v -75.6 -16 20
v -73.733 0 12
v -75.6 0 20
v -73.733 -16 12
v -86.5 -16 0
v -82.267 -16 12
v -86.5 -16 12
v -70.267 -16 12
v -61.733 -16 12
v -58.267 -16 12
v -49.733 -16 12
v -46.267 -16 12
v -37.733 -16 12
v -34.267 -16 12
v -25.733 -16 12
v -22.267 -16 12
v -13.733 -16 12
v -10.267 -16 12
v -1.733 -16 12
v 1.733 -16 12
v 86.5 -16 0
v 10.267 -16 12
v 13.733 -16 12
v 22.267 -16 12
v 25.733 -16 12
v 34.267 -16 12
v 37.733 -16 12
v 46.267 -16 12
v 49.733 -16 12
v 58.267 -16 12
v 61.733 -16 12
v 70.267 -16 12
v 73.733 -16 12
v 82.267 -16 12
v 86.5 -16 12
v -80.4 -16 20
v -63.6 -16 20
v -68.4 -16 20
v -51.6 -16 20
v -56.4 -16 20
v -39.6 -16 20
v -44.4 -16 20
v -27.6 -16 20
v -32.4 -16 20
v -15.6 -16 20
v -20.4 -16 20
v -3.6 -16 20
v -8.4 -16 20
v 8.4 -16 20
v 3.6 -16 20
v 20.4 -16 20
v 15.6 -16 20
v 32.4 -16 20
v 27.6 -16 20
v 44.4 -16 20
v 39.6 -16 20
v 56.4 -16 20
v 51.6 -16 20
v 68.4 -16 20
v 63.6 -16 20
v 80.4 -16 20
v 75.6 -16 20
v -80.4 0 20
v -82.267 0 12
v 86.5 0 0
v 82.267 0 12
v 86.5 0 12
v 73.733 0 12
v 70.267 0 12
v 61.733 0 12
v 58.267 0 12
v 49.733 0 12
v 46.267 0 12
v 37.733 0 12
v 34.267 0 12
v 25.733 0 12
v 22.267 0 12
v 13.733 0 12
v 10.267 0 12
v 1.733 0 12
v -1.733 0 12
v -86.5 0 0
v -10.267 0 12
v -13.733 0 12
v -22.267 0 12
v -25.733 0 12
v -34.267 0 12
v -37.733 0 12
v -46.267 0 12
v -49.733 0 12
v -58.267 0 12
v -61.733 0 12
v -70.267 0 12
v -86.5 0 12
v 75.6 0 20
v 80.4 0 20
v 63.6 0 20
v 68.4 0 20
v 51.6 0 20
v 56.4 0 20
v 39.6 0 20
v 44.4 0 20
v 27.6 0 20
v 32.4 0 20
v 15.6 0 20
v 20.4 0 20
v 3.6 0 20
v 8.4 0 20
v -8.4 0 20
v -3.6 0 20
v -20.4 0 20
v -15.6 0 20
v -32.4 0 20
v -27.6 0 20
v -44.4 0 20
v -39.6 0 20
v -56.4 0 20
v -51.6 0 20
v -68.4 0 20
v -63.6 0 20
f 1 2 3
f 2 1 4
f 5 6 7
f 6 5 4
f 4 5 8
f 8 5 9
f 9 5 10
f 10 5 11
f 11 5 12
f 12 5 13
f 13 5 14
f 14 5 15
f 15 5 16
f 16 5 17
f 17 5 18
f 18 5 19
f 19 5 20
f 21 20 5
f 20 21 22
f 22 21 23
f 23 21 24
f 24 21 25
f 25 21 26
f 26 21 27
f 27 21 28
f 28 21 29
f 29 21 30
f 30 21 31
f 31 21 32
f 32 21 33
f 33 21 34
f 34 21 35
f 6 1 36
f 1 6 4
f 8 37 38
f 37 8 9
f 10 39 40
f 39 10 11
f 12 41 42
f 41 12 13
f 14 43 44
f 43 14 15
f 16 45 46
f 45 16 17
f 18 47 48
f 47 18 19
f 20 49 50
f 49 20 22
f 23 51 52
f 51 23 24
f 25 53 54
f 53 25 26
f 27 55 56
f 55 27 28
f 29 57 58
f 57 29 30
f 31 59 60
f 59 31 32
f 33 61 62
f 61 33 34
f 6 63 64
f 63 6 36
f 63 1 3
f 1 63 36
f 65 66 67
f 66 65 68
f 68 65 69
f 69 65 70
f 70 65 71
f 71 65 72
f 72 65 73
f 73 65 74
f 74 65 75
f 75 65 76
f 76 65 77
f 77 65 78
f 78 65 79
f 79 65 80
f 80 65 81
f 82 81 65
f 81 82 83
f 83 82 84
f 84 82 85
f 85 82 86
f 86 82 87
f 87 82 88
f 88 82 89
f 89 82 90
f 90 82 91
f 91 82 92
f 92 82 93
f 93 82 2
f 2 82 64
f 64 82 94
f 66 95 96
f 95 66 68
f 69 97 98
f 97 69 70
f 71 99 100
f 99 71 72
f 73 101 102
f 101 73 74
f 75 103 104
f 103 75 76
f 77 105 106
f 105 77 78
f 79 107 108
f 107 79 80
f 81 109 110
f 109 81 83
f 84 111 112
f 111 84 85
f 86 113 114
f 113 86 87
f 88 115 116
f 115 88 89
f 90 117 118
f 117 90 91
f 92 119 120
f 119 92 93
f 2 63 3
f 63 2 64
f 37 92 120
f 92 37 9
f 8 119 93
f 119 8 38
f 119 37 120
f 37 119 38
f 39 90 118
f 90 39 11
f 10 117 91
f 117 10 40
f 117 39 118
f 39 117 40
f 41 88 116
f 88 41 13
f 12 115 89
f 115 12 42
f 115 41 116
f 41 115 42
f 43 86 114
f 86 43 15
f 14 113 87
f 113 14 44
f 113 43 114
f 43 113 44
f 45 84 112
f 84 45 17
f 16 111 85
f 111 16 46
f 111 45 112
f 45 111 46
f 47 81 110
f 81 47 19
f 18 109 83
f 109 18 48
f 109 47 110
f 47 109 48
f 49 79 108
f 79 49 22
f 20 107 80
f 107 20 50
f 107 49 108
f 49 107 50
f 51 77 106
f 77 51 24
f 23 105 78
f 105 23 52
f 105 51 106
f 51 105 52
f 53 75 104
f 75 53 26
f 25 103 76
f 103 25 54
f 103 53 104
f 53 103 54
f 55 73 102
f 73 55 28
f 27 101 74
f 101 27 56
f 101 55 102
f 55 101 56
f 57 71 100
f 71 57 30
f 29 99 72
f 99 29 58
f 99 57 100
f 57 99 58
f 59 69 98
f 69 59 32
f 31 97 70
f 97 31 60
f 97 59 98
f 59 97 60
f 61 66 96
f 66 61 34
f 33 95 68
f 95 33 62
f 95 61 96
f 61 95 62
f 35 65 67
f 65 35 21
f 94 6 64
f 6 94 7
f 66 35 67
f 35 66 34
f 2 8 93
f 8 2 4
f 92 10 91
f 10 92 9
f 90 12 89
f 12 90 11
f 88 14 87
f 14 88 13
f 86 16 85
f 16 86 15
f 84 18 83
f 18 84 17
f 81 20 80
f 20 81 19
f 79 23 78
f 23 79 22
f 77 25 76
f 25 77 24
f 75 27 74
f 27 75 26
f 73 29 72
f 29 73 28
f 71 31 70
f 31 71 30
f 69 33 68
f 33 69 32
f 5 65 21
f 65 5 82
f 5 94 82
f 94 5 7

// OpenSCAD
$fn = 32;

// ----------------------------------------------------------------------
// Toothed rack, 14 teeth
// 12 mm pitch, 8 mm teeth
// ----------------------------------------------------------------------

// --- parameters (mm) ---
bar_w = 16;     // bar width (Y)
bar_h = 12;     // bar height (Z)
teeth = 14;     // number of teeth
pitch = 12;     // tooth pitch
tooth_h = 8;    // tooth height above the bar
root_w = 9;     // tooth width at the root
crest_w = 4.8;  // tooth width at the crest

// --- derived feature positions (mm) ---
span = (teeth - 1) * pitch;  // = 156   distance between the outer teeth
bar_l = span + root_w + 8;   // = 173   bar length: teeth plus 4 mm at each end
tooth_x = -span / 2;         // = -78   X of the first tooth
height = bar_h + tooth_h;    // = 20   overall height
feature_centers = [
  [tooth_x + 0 * pitch, -bar_w / 2],
  [tooth_x + 1 * pitch, -bar_w / 2],
  [tooth_x + 2 * pitch, -bar_w / 2],
  [tooth_x + 3 * pitch, -bar_w / 2],
  [tooth_x + 4 * pitch, -bar_w / 2],
  [tooth_x + 5 * pitch, -bar_w / 2],
  [tooth_x + 6 * pitch, -bar_w / 2],
  [tooth_x + 7 * pitch, -bar_w / 2],
  [tooth_x + 8 * pitch, -bar_w / 2],
  [tooth_x + 9 * pitch, -bar_w / 2],
  [tooth_x + 10 * pitch, -bar_w / 2],
  [tooth_x + 11 * pitch, -bar_w / 2],
  [tooth_x + 12 * pitch, -bar_w / 2],
  [tooth_x + 13 * pitch, -bar_w / 2]
];   // tooth centre line, drives the tooth loop

// bar with a rack of teeth, one extruded trapezoium per centre
module rack_tooth() {
  linear_extrude(height = bar_w)
    polygon(points = [
      [0, 0],
      [root_w, 0],
      [root_w / 2 + crest_w / 2, tooth_h + 1],
      [root_w / 2 - crest_w / 2, tooth_h + 1]
    ]);
}

union() {
  translate([-bar_l / 2, -bar_w, 0]) cube([bar_l, bar_w, bar_h]);
  for (centre = feature_centers)
    translate([centre[0] - root_w / 2, 0, bar_h - 1]) rotate([90, 0, 0]) rack_tooth();
}
